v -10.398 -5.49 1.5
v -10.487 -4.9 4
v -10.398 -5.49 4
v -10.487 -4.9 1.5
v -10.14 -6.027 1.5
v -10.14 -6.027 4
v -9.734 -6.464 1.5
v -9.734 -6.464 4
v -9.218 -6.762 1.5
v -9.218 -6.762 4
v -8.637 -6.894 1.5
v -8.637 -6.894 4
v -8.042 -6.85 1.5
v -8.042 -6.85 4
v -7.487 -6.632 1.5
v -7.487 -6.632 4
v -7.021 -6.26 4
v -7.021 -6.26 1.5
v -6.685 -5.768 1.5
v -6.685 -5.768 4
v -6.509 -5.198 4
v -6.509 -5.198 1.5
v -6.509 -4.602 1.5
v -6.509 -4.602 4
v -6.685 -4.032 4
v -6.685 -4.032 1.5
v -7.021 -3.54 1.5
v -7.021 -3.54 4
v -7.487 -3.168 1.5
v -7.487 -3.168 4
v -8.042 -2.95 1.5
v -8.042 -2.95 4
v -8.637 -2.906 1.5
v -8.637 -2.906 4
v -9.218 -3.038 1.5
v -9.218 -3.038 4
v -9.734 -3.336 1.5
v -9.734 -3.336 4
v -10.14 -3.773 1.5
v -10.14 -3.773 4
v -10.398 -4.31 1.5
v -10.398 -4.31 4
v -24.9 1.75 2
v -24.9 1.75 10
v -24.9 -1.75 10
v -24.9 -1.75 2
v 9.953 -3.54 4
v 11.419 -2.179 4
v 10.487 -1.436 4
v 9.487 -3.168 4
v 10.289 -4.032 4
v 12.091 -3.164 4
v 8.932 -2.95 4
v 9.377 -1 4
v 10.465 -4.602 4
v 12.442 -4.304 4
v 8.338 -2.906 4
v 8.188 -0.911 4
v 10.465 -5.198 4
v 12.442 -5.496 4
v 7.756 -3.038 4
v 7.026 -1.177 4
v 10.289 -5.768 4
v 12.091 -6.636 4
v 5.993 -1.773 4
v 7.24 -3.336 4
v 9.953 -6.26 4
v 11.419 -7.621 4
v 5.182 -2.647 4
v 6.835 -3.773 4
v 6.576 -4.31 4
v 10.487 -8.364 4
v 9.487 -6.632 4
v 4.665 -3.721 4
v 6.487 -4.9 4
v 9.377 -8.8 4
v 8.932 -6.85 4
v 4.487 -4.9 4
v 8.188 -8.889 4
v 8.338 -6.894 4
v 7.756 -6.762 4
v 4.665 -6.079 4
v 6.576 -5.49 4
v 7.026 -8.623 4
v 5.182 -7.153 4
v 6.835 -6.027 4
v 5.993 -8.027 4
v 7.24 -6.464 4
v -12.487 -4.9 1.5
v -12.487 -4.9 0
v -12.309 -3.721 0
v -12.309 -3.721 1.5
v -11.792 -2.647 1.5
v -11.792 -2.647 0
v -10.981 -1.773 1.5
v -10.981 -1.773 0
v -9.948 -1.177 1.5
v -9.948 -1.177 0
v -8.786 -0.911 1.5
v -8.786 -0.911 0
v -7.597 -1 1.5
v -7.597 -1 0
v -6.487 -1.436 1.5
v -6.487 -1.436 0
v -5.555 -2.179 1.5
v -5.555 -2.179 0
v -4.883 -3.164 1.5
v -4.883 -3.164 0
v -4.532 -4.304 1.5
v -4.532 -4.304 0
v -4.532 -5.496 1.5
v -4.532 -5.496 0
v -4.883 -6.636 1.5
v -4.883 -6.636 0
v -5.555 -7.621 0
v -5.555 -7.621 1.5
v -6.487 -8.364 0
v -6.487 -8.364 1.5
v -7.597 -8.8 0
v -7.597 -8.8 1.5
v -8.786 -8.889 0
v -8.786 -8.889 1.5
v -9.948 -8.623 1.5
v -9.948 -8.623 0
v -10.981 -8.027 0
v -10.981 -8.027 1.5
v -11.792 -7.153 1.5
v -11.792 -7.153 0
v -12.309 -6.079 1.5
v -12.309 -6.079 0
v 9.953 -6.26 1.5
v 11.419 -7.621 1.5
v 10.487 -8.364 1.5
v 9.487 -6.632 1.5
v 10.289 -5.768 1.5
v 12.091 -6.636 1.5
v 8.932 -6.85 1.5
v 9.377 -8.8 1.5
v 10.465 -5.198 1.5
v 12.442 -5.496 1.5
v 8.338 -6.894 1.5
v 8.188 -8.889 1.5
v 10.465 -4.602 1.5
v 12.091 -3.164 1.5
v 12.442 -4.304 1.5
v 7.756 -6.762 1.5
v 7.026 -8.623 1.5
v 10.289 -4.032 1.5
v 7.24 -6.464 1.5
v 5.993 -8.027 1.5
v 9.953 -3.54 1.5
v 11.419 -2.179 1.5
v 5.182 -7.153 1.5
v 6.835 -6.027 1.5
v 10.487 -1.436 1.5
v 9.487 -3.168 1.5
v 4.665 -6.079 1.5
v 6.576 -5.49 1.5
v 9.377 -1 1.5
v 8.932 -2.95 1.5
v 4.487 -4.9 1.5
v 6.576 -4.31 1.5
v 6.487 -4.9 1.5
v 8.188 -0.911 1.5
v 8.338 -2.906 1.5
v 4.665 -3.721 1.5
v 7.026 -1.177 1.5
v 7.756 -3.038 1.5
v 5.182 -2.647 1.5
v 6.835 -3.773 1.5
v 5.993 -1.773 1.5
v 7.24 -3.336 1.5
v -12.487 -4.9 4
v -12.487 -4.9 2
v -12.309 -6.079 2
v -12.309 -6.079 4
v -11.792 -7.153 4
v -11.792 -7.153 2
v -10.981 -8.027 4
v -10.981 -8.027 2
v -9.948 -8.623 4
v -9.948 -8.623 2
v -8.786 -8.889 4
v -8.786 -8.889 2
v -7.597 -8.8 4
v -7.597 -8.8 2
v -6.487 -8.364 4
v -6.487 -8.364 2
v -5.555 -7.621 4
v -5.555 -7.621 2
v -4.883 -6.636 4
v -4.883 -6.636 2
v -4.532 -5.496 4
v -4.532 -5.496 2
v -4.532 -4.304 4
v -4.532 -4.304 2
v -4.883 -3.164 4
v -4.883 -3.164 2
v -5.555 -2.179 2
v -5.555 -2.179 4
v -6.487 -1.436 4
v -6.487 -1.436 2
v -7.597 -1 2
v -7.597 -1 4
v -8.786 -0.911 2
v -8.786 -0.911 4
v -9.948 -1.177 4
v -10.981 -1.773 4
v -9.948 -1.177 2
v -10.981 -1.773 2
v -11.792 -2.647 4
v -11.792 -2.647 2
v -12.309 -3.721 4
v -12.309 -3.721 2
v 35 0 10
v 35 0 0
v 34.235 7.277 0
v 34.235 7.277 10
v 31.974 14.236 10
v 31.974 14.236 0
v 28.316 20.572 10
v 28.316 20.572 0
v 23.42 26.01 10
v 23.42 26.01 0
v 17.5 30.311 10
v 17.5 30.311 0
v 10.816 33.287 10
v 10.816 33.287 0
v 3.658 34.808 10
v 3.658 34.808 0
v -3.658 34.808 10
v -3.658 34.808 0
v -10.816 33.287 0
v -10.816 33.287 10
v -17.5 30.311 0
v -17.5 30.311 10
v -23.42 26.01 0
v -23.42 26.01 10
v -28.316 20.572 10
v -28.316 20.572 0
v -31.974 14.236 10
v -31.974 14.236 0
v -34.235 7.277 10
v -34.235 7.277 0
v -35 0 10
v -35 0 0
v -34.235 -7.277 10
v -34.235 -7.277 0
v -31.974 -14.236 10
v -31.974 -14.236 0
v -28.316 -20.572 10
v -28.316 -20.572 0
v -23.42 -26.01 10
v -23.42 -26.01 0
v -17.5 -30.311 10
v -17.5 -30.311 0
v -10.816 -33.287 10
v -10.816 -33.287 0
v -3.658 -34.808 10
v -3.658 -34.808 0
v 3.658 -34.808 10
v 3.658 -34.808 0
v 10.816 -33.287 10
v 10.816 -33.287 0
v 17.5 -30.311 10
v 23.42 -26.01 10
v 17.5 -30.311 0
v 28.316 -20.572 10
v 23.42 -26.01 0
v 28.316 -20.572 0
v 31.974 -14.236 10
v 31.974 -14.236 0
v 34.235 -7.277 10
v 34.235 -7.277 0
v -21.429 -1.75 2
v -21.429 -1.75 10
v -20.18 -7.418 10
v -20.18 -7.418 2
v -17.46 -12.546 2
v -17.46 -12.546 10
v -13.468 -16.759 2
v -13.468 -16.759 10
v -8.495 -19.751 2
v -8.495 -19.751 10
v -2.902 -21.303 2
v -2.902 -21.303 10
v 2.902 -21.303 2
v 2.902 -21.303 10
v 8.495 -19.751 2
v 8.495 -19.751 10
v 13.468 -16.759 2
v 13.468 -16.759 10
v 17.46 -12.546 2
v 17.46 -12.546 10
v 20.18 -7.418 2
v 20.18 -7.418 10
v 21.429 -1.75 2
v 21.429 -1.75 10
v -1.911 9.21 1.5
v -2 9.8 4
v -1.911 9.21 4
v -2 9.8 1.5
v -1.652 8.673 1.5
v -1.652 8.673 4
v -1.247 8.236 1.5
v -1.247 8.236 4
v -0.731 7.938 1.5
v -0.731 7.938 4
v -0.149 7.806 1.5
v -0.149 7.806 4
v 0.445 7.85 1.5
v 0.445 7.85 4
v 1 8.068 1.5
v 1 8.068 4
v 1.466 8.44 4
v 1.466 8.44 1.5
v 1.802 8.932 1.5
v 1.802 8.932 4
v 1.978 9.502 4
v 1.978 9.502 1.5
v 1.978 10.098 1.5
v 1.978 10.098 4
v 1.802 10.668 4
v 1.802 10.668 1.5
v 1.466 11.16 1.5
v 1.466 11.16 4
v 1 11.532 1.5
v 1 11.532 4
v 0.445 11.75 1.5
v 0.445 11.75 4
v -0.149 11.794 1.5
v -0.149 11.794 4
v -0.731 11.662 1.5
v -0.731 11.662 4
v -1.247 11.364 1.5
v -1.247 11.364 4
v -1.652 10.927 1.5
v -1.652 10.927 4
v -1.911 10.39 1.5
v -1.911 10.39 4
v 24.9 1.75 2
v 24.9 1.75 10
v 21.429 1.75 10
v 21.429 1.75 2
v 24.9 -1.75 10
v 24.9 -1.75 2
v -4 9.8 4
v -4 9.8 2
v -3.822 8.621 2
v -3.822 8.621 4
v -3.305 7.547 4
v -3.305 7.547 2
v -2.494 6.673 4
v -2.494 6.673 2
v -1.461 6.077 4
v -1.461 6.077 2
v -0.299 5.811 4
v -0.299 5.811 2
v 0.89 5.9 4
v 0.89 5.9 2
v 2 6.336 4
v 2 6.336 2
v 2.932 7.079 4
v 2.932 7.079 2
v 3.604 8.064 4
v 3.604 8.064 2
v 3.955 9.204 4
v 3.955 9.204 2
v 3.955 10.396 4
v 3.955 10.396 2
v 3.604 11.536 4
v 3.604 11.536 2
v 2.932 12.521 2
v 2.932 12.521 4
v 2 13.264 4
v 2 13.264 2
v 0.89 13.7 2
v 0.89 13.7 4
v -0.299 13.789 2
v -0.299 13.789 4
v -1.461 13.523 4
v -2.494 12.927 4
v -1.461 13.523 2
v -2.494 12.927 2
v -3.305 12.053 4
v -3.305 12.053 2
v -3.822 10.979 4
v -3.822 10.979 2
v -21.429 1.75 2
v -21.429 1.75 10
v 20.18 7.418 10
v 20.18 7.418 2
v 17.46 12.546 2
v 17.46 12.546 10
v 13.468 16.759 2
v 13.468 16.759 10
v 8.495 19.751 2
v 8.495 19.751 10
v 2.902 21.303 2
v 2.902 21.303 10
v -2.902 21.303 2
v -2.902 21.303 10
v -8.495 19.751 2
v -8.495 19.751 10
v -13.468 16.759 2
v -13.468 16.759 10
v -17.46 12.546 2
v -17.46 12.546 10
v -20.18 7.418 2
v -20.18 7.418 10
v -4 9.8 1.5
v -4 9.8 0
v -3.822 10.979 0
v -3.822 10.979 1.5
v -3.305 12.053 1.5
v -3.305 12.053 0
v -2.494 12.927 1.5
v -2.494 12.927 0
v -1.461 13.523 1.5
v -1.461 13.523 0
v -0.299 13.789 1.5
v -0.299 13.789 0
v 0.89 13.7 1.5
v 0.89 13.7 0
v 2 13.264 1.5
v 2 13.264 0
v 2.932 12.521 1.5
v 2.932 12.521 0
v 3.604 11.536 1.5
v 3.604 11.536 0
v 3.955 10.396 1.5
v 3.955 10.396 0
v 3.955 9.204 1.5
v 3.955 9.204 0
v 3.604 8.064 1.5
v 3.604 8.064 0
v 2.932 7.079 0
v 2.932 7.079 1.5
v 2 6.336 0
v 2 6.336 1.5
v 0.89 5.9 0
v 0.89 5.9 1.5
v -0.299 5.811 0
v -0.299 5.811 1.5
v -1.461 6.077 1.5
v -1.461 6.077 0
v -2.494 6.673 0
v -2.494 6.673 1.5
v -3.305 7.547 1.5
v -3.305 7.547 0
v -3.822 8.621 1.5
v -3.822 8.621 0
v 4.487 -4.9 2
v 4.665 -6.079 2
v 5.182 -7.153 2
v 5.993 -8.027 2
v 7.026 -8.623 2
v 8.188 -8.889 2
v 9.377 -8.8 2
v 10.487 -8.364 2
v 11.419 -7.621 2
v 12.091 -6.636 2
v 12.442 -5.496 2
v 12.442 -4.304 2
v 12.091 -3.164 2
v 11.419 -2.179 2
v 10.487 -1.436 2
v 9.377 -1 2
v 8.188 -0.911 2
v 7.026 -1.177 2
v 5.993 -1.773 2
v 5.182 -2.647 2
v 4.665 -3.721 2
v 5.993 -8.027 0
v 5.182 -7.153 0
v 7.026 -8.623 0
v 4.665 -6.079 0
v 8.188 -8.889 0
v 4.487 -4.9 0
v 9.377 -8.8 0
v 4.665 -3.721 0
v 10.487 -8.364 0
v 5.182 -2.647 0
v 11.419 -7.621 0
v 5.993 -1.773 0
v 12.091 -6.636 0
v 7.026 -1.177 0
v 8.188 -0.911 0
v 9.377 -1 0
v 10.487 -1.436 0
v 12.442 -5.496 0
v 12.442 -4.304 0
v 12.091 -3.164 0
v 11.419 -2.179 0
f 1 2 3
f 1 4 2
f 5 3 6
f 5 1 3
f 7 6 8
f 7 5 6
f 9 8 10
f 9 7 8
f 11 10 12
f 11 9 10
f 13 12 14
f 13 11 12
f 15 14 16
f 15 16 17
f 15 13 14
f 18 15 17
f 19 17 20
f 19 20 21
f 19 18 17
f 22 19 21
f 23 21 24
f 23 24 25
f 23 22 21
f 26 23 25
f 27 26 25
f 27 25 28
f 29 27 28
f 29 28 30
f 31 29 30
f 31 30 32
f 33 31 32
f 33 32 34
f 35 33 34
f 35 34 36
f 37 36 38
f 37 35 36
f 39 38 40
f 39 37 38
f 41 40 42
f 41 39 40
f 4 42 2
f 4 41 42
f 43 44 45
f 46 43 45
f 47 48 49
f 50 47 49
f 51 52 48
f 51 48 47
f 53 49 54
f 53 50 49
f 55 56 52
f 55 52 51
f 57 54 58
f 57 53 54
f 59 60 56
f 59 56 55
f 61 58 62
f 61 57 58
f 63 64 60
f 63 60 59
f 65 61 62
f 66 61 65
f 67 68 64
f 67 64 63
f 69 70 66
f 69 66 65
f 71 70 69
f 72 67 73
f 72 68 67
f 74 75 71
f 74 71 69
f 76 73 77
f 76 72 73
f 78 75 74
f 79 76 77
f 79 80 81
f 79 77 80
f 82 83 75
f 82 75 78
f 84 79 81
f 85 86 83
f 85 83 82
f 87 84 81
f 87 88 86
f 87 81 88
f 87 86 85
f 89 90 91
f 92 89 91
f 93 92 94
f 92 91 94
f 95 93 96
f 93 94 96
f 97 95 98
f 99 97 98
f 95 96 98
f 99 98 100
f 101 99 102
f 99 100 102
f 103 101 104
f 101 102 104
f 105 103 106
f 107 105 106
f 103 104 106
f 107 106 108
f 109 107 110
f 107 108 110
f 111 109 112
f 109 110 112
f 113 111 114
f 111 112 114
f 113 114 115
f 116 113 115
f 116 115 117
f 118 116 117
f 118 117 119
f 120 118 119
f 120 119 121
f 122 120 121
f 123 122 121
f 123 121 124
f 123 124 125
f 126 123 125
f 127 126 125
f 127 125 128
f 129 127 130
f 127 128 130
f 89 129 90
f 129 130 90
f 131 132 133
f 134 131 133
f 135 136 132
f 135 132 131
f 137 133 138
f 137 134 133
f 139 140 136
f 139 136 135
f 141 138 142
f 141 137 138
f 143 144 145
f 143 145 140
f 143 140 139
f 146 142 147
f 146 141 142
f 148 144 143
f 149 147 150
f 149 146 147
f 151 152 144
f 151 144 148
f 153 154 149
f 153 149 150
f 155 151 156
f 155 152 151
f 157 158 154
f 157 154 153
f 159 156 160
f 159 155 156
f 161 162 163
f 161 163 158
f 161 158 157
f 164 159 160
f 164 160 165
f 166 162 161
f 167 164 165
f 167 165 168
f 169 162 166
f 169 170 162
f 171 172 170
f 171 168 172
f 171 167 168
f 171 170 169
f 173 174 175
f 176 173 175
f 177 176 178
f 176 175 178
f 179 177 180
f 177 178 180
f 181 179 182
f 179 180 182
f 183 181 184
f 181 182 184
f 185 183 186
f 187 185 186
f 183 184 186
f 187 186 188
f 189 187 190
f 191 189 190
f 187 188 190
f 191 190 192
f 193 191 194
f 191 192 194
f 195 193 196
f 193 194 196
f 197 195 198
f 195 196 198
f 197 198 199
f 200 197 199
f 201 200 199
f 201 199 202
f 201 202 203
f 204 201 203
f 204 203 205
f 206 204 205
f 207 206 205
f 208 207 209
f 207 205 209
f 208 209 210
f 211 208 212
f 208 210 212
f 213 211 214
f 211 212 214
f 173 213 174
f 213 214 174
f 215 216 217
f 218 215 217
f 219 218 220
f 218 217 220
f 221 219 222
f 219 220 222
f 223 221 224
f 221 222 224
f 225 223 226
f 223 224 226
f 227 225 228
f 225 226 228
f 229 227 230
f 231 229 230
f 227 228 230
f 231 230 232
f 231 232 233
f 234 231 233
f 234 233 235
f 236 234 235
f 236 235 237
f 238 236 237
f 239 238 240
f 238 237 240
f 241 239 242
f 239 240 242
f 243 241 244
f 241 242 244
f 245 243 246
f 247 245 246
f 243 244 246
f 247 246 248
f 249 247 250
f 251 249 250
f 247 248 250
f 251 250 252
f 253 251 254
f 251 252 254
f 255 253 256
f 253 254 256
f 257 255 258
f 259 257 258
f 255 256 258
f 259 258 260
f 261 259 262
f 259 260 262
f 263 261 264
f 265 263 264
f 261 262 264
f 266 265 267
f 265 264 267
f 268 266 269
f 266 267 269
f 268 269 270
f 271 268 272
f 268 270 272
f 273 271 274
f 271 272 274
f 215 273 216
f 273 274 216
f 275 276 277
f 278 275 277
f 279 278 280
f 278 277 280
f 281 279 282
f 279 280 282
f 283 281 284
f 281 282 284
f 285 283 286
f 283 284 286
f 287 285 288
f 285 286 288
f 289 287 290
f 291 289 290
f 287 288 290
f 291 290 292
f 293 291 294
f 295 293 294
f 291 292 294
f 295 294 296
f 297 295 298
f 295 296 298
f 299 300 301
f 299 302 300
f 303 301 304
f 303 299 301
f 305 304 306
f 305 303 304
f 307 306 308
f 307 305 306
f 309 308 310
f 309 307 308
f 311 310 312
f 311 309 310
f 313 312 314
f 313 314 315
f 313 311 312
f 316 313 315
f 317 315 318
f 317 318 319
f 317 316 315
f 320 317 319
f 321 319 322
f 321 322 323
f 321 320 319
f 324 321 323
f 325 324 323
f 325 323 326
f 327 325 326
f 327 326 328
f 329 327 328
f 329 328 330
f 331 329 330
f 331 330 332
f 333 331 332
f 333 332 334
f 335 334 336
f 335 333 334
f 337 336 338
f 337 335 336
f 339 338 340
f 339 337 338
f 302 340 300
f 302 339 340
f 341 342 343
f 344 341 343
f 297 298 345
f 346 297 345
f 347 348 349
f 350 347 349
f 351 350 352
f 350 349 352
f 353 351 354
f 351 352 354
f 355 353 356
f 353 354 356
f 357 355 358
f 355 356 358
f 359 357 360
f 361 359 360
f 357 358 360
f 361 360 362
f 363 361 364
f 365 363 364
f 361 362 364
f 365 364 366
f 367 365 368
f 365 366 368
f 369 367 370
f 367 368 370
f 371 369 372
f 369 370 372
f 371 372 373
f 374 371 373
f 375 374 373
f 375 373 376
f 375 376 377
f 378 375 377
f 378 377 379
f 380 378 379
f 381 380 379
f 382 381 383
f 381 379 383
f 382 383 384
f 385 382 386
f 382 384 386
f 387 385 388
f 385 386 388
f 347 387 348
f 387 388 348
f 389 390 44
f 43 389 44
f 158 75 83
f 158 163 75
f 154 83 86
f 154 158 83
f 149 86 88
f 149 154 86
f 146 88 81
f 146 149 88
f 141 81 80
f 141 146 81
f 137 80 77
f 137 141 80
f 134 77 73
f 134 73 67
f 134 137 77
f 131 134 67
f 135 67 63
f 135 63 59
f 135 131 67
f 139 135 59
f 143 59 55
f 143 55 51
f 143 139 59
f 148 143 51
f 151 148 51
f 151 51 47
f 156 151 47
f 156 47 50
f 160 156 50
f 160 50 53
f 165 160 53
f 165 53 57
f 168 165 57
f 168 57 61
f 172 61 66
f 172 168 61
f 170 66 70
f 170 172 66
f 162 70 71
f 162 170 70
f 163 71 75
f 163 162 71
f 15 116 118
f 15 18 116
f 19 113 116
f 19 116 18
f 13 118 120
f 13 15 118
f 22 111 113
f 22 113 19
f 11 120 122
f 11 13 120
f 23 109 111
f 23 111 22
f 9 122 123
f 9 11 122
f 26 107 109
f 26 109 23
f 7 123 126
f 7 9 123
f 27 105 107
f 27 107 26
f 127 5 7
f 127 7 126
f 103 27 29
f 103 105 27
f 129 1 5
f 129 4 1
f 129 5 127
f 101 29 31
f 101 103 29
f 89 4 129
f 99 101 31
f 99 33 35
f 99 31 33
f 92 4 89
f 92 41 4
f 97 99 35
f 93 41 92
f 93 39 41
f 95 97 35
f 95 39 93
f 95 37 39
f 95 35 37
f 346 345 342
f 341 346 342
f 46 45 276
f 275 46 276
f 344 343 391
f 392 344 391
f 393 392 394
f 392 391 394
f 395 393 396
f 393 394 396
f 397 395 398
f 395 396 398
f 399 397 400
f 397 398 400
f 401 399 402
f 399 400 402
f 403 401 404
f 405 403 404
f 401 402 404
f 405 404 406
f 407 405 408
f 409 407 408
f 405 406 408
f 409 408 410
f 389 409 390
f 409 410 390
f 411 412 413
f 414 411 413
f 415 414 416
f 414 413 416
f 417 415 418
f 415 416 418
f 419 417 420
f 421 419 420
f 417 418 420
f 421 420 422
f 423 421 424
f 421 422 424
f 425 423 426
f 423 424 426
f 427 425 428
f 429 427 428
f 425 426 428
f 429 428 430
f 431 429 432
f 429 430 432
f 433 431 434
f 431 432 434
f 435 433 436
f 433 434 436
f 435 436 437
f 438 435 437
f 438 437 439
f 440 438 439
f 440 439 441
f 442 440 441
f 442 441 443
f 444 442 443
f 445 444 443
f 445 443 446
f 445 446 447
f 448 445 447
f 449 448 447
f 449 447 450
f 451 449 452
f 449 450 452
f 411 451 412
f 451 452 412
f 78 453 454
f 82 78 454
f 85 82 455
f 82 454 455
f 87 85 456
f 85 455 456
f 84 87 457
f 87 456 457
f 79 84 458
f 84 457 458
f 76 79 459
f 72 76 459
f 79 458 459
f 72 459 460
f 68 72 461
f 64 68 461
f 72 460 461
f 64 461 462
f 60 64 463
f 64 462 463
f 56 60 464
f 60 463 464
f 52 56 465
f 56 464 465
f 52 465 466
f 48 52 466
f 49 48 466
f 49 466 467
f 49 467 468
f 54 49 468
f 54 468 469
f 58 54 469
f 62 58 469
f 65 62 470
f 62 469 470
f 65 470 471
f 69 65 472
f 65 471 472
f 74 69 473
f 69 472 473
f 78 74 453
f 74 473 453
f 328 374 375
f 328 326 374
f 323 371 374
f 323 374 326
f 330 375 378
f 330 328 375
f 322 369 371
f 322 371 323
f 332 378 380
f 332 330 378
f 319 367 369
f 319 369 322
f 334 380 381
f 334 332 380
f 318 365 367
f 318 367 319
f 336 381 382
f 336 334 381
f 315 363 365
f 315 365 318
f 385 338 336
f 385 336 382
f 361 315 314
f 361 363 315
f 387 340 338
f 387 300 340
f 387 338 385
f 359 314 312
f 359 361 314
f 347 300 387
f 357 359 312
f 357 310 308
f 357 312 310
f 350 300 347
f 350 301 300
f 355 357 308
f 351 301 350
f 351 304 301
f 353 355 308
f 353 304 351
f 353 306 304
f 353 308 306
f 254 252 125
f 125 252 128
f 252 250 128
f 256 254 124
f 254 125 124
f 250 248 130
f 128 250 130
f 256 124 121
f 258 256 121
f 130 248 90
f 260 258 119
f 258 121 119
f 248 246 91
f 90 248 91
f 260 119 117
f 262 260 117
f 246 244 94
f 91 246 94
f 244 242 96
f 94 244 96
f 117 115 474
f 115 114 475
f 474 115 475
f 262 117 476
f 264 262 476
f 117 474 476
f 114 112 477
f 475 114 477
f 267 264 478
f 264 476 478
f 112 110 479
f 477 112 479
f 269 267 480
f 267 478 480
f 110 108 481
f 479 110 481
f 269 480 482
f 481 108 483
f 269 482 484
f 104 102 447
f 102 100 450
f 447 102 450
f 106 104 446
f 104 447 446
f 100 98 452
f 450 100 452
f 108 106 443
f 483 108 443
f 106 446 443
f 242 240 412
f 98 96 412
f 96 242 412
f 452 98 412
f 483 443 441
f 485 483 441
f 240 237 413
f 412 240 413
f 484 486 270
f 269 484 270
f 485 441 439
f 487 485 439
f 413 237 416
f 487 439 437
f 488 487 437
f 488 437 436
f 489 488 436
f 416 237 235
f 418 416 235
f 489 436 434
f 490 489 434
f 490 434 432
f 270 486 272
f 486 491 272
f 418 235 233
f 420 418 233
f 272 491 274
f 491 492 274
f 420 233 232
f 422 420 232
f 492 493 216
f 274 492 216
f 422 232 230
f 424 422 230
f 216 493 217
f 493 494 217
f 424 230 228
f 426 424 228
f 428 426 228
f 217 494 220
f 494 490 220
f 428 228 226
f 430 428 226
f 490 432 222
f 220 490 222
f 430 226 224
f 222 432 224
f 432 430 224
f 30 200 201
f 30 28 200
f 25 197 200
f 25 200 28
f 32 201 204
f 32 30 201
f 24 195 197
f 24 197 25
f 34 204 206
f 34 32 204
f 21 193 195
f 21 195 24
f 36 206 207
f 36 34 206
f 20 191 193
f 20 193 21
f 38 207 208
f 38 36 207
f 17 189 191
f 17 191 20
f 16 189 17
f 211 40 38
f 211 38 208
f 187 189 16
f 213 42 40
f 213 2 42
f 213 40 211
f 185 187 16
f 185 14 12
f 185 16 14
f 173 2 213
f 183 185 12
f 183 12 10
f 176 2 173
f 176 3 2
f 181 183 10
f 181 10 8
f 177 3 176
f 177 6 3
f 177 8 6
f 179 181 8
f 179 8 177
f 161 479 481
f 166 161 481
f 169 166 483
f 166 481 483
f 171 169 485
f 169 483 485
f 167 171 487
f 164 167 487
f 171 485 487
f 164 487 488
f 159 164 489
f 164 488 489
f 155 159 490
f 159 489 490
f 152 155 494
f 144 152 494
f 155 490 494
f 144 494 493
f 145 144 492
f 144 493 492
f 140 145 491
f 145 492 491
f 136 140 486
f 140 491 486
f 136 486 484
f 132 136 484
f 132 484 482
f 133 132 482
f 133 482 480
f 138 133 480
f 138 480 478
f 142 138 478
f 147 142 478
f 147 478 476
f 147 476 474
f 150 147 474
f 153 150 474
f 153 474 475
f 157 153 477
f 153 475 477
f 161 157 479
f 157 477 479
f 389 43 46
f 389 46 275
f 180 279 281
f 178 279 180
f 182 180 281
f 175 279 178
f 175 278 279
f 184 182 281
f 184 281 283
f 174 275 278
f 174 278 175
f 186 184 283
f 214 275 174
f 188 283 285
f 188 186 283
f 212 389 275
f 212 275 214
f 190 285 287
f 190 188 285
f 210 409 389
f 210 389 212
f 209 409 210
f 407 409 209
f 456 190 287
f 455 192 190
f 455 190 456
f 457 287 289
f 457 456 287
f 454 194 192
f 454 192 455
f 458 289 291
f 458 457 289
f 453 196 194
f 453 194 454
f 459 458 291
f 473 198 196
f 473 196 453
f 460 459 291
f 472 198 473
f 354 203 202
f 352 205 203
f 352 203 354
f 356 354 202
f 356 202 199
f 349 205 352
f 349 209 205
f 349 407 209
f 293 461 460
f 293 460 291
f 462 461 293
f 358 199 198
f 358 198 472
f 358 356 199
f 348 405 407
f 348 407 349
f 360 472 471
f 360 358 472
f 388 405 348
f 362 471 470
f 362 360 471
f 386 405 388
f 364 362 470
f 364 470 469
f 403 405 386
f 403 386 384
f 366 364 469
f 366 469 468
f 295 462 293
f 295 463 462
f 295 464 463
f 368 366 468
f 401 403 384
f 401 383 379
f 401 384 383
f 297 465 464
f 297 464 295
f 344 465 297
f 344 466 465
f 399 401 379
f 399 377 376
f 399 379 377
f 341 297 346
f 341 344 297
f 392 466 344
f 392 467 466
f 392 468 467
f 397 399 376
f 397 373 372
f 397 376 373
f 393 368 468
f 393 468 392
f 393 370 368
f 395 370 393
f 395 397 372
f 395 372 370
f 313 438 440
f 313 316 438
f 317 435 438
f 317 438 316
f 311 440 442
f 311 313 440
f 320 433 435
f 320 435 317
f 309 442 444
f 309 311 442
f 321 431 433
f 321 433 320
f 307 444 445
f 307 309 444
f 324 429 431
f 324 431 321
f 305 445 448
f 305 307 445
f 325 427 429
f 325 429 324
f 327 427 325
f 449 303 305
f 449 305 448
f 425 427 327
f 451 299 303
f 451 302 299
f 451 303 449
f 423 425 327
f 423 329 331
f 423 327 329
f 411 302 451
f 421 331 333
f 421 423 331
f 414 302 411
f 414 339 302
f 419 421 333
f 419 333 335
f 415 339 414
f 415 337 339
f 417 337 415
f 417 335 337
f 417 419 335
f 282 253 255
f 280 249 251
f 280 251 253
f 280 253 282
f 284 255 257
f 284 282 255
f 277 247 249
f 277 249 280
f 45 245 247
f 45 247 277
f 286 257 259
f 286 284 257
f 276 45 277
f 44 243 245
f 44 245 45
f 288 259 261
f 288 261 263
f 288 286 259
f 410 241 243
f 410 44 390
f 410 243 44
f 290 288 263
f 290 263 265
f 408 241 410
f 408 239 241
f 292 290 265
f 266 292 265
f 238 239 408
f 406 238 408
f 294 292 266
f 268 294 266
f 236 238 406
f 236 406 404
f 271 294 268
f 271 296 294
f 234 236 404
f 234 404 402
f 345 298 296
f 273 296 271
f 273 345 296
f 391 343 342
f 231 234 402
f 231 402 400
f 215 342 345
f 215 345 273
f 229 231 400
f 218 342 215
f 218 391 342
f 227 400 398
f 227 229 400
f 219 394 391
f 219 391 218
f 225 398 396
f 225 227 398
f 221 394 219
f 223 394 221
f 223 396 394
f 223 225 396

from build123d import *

# Parameters (mm, degrees)
SKETCH_1_R          = 35
EXTRUDE_1_DEPTH     = 10
CUT_EXTRUDE_1_DEPTH = 8
SKETCH_4_R          = 4
CUT_EXTRUDE_2_DEPTH = 1.5
SKETCH_6_R          = 2
CUT_EXTRUDE_3_DEPTH = 51.222007128
SKETCH_7_R          = 4
SKETCH_7_R_2        = 2
EXTRUDE_2_DEPTH     = 2
SKETCH_8_R          = 4
SKETCH_8_R_2        = 2
EXTRUDE_3_DEPTH     = 2
SKETCH_9_R          = 4
SKETCH_9_R_2        = 2
EXTRUDE_4_DEPTH     = 2


with BuildPart() as part:
    # 草图1 → 凸台-拉伸1 (new body)
    with BuildSketch(Plane.XY):
        Circle(SKETCH_1_R)
    extrude(amount=EXTRUDE_1_DEPTH)

    # 草图2 → 切除-拉伸1 (cut)
    with BuildSketch(Plane.XY.offset(10)):
        with BuildLine():
            ThreePointArc((21.428660714, 1.75), (0, 21.5), (-21.428660714, 1.75))
            Line((-21.428660714, 1.75), (-24.9, 1.75))
            Line((-24.9, 1.75), (-24.9, -1.75))
            Line((-24.9, -1.75), (-21.428660714, -1.75))
            ThreePointArc((-21.428660714, -1.75), (0, -21.5), (21.428660714, -1.75))
            Line((21.428660714, -1.75), (24.9, -1.75))
            Line((24.9, -1.75), (24.9, 1.75))
            Line((24.9, 1.75), (21.428660714, 1.75))
        make_face()
    extrude(amount=-CUT_EXTRUDE_1_DEPTH, mode=Mode.SUBTRACT)

    # 草图4 → 切除-拉伸2 (cut)
    with BuildSketch(Plane(origin=(0, 0, 0), x_dir=(-1, 0, 0), z_dir=(0, 0, -1))):
        with Locations((8.487048957, -4.9)):
            Circle(SKETCH_4_R)
        with Locations((-8.487048957, -4.9)):
            Circle(SKETCH_4_R)
        with Locations((0, 9.8)):
            Circle(SKETCH_4_R)
    extrude(amount=-CUT_EXTRUDE_2_DEPTH, mode=Mode.SUBTRACT)

    # 草图6 → 切除-拉伸3 (cut, through all)
    with BuildSketch(Plane(origin=(0, 0, 1.5), x_dir=(-1, 0, 0), z_dir=(0, 0, -1))):
        with Locations((0, 9.8)):
            Circle(SKETCH_6_R)
        with Locations((8.487048957, -4.9)):
            Circle(SKETCH_6_R)
        with Locations((-8.487048957, -4.9)):
            Circle(SKETCH_6_R)
    extrude(amount=-CUT_EXTRUDE_3_DEPTH, mode=Mode.SUBTRACT)

    # 草图7 → 凸台-拉伸2 (add)
    with BuildSketch(Plane.XY.offset(2)):
        with Locations(Location((0, 9.8, 0), (0, 0, 180))):
            Circle(SKETCH_7_R)
        with Locations(Location((0, 9.8, 0), (0, 0, 180))):
            Circle(SKETCH_7_R_2, mode=Mode.SUBTRACT)
    extrude(amount=EXTRUDE_2_DEPTH)

    # 草图8 → 凸台-拉伸3 (add)
    with BuildSketch(Plane.XY.offset(2)):
        with Locations(Location((-8.487048957, -4.9, 0), (0, 0, 180))):
            Circle(SKETCH_8_R)
        with Locations(Location((-8.487048957, -4.9, 0), (0, 0, 180))):
            Circle(SKETCH_8_R_2, mode=Mode.SUBTRACT)
    extrude(amount=EXTRUDE_3_DEPTH)

    # 草图9 → 凸台-拉伸4 (add)
    with BuildSketch(Plane.XY.offset(2)):
        with Locations(Location((8.487048957, -4.9, 0), (0, 0, 180))):
            Circle(SKETCH_9_R)
        with Locations(Location((8.487048957, -4.9, 0), (0, 0, 180))):
            Circle(SKETCH_9_R_2, mode=Mode.SUBTRACT)
    extrude(amount=EXTRUDE_4_DEPTH)


solid = part.part
